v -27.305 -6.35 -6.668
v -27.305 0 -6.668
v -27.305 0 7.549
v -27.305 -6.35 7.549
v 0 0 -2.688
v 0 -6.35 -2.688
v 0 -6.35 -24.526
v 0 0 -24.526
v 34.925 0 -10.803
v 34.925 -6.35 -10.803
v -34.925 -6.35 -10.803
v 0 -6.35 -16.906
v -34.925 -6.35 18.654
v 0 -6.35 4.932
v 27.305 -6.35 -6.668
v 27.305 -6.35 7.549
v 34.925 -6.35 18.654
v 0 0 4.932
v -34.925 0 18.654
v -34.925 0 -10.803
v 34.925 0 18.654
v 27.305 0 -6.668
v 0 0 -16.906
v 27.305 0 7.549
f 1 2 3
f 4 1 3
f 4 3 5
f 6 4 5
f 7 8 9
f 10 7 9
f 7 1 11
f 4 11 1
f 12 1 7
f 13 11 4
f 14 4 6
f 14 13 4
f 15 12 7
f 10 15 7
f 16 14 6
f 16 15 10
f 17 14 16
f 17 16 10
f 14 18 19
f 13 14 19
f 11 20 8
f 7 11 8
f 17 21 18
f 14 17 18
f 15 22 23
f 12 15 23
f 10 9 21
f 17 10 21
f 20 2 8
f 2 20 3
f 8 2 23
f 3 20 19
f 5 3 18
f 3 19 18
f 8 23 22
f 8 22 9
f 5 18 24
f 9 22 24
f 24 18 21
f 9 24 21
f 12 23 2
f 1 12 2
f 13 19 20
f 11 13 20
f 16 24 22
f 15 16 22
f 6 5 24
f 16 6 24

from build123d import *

# Parameters (mm, degrees)
F1_DEPTH = 6.35


with BuildPart() as f1:
    # F0 (on Front) → F1 (new body)
    with BuildSketch(Plane.XZ):
        Polygon((34.925, 18.654233), (0, 4.931788), (0, 0), (0, -2.688212), (27.305, 7.549116), (27.305, -6.668439), (0, -16.905767), (0, -24.525767), (34.925, -10.803323), align=None)
        Polygon((0, 0), (0, 4.931788), (-34.925, 18.654233), (-34.925, -10.803323), (0, -24.525767), (0, -16.905767), (-27.305, -6.668439), (-27.305, 7.549116), (0, -2.688212), align=None)
    extrude(amount=F1_DEPTH)


solid = f1.part
